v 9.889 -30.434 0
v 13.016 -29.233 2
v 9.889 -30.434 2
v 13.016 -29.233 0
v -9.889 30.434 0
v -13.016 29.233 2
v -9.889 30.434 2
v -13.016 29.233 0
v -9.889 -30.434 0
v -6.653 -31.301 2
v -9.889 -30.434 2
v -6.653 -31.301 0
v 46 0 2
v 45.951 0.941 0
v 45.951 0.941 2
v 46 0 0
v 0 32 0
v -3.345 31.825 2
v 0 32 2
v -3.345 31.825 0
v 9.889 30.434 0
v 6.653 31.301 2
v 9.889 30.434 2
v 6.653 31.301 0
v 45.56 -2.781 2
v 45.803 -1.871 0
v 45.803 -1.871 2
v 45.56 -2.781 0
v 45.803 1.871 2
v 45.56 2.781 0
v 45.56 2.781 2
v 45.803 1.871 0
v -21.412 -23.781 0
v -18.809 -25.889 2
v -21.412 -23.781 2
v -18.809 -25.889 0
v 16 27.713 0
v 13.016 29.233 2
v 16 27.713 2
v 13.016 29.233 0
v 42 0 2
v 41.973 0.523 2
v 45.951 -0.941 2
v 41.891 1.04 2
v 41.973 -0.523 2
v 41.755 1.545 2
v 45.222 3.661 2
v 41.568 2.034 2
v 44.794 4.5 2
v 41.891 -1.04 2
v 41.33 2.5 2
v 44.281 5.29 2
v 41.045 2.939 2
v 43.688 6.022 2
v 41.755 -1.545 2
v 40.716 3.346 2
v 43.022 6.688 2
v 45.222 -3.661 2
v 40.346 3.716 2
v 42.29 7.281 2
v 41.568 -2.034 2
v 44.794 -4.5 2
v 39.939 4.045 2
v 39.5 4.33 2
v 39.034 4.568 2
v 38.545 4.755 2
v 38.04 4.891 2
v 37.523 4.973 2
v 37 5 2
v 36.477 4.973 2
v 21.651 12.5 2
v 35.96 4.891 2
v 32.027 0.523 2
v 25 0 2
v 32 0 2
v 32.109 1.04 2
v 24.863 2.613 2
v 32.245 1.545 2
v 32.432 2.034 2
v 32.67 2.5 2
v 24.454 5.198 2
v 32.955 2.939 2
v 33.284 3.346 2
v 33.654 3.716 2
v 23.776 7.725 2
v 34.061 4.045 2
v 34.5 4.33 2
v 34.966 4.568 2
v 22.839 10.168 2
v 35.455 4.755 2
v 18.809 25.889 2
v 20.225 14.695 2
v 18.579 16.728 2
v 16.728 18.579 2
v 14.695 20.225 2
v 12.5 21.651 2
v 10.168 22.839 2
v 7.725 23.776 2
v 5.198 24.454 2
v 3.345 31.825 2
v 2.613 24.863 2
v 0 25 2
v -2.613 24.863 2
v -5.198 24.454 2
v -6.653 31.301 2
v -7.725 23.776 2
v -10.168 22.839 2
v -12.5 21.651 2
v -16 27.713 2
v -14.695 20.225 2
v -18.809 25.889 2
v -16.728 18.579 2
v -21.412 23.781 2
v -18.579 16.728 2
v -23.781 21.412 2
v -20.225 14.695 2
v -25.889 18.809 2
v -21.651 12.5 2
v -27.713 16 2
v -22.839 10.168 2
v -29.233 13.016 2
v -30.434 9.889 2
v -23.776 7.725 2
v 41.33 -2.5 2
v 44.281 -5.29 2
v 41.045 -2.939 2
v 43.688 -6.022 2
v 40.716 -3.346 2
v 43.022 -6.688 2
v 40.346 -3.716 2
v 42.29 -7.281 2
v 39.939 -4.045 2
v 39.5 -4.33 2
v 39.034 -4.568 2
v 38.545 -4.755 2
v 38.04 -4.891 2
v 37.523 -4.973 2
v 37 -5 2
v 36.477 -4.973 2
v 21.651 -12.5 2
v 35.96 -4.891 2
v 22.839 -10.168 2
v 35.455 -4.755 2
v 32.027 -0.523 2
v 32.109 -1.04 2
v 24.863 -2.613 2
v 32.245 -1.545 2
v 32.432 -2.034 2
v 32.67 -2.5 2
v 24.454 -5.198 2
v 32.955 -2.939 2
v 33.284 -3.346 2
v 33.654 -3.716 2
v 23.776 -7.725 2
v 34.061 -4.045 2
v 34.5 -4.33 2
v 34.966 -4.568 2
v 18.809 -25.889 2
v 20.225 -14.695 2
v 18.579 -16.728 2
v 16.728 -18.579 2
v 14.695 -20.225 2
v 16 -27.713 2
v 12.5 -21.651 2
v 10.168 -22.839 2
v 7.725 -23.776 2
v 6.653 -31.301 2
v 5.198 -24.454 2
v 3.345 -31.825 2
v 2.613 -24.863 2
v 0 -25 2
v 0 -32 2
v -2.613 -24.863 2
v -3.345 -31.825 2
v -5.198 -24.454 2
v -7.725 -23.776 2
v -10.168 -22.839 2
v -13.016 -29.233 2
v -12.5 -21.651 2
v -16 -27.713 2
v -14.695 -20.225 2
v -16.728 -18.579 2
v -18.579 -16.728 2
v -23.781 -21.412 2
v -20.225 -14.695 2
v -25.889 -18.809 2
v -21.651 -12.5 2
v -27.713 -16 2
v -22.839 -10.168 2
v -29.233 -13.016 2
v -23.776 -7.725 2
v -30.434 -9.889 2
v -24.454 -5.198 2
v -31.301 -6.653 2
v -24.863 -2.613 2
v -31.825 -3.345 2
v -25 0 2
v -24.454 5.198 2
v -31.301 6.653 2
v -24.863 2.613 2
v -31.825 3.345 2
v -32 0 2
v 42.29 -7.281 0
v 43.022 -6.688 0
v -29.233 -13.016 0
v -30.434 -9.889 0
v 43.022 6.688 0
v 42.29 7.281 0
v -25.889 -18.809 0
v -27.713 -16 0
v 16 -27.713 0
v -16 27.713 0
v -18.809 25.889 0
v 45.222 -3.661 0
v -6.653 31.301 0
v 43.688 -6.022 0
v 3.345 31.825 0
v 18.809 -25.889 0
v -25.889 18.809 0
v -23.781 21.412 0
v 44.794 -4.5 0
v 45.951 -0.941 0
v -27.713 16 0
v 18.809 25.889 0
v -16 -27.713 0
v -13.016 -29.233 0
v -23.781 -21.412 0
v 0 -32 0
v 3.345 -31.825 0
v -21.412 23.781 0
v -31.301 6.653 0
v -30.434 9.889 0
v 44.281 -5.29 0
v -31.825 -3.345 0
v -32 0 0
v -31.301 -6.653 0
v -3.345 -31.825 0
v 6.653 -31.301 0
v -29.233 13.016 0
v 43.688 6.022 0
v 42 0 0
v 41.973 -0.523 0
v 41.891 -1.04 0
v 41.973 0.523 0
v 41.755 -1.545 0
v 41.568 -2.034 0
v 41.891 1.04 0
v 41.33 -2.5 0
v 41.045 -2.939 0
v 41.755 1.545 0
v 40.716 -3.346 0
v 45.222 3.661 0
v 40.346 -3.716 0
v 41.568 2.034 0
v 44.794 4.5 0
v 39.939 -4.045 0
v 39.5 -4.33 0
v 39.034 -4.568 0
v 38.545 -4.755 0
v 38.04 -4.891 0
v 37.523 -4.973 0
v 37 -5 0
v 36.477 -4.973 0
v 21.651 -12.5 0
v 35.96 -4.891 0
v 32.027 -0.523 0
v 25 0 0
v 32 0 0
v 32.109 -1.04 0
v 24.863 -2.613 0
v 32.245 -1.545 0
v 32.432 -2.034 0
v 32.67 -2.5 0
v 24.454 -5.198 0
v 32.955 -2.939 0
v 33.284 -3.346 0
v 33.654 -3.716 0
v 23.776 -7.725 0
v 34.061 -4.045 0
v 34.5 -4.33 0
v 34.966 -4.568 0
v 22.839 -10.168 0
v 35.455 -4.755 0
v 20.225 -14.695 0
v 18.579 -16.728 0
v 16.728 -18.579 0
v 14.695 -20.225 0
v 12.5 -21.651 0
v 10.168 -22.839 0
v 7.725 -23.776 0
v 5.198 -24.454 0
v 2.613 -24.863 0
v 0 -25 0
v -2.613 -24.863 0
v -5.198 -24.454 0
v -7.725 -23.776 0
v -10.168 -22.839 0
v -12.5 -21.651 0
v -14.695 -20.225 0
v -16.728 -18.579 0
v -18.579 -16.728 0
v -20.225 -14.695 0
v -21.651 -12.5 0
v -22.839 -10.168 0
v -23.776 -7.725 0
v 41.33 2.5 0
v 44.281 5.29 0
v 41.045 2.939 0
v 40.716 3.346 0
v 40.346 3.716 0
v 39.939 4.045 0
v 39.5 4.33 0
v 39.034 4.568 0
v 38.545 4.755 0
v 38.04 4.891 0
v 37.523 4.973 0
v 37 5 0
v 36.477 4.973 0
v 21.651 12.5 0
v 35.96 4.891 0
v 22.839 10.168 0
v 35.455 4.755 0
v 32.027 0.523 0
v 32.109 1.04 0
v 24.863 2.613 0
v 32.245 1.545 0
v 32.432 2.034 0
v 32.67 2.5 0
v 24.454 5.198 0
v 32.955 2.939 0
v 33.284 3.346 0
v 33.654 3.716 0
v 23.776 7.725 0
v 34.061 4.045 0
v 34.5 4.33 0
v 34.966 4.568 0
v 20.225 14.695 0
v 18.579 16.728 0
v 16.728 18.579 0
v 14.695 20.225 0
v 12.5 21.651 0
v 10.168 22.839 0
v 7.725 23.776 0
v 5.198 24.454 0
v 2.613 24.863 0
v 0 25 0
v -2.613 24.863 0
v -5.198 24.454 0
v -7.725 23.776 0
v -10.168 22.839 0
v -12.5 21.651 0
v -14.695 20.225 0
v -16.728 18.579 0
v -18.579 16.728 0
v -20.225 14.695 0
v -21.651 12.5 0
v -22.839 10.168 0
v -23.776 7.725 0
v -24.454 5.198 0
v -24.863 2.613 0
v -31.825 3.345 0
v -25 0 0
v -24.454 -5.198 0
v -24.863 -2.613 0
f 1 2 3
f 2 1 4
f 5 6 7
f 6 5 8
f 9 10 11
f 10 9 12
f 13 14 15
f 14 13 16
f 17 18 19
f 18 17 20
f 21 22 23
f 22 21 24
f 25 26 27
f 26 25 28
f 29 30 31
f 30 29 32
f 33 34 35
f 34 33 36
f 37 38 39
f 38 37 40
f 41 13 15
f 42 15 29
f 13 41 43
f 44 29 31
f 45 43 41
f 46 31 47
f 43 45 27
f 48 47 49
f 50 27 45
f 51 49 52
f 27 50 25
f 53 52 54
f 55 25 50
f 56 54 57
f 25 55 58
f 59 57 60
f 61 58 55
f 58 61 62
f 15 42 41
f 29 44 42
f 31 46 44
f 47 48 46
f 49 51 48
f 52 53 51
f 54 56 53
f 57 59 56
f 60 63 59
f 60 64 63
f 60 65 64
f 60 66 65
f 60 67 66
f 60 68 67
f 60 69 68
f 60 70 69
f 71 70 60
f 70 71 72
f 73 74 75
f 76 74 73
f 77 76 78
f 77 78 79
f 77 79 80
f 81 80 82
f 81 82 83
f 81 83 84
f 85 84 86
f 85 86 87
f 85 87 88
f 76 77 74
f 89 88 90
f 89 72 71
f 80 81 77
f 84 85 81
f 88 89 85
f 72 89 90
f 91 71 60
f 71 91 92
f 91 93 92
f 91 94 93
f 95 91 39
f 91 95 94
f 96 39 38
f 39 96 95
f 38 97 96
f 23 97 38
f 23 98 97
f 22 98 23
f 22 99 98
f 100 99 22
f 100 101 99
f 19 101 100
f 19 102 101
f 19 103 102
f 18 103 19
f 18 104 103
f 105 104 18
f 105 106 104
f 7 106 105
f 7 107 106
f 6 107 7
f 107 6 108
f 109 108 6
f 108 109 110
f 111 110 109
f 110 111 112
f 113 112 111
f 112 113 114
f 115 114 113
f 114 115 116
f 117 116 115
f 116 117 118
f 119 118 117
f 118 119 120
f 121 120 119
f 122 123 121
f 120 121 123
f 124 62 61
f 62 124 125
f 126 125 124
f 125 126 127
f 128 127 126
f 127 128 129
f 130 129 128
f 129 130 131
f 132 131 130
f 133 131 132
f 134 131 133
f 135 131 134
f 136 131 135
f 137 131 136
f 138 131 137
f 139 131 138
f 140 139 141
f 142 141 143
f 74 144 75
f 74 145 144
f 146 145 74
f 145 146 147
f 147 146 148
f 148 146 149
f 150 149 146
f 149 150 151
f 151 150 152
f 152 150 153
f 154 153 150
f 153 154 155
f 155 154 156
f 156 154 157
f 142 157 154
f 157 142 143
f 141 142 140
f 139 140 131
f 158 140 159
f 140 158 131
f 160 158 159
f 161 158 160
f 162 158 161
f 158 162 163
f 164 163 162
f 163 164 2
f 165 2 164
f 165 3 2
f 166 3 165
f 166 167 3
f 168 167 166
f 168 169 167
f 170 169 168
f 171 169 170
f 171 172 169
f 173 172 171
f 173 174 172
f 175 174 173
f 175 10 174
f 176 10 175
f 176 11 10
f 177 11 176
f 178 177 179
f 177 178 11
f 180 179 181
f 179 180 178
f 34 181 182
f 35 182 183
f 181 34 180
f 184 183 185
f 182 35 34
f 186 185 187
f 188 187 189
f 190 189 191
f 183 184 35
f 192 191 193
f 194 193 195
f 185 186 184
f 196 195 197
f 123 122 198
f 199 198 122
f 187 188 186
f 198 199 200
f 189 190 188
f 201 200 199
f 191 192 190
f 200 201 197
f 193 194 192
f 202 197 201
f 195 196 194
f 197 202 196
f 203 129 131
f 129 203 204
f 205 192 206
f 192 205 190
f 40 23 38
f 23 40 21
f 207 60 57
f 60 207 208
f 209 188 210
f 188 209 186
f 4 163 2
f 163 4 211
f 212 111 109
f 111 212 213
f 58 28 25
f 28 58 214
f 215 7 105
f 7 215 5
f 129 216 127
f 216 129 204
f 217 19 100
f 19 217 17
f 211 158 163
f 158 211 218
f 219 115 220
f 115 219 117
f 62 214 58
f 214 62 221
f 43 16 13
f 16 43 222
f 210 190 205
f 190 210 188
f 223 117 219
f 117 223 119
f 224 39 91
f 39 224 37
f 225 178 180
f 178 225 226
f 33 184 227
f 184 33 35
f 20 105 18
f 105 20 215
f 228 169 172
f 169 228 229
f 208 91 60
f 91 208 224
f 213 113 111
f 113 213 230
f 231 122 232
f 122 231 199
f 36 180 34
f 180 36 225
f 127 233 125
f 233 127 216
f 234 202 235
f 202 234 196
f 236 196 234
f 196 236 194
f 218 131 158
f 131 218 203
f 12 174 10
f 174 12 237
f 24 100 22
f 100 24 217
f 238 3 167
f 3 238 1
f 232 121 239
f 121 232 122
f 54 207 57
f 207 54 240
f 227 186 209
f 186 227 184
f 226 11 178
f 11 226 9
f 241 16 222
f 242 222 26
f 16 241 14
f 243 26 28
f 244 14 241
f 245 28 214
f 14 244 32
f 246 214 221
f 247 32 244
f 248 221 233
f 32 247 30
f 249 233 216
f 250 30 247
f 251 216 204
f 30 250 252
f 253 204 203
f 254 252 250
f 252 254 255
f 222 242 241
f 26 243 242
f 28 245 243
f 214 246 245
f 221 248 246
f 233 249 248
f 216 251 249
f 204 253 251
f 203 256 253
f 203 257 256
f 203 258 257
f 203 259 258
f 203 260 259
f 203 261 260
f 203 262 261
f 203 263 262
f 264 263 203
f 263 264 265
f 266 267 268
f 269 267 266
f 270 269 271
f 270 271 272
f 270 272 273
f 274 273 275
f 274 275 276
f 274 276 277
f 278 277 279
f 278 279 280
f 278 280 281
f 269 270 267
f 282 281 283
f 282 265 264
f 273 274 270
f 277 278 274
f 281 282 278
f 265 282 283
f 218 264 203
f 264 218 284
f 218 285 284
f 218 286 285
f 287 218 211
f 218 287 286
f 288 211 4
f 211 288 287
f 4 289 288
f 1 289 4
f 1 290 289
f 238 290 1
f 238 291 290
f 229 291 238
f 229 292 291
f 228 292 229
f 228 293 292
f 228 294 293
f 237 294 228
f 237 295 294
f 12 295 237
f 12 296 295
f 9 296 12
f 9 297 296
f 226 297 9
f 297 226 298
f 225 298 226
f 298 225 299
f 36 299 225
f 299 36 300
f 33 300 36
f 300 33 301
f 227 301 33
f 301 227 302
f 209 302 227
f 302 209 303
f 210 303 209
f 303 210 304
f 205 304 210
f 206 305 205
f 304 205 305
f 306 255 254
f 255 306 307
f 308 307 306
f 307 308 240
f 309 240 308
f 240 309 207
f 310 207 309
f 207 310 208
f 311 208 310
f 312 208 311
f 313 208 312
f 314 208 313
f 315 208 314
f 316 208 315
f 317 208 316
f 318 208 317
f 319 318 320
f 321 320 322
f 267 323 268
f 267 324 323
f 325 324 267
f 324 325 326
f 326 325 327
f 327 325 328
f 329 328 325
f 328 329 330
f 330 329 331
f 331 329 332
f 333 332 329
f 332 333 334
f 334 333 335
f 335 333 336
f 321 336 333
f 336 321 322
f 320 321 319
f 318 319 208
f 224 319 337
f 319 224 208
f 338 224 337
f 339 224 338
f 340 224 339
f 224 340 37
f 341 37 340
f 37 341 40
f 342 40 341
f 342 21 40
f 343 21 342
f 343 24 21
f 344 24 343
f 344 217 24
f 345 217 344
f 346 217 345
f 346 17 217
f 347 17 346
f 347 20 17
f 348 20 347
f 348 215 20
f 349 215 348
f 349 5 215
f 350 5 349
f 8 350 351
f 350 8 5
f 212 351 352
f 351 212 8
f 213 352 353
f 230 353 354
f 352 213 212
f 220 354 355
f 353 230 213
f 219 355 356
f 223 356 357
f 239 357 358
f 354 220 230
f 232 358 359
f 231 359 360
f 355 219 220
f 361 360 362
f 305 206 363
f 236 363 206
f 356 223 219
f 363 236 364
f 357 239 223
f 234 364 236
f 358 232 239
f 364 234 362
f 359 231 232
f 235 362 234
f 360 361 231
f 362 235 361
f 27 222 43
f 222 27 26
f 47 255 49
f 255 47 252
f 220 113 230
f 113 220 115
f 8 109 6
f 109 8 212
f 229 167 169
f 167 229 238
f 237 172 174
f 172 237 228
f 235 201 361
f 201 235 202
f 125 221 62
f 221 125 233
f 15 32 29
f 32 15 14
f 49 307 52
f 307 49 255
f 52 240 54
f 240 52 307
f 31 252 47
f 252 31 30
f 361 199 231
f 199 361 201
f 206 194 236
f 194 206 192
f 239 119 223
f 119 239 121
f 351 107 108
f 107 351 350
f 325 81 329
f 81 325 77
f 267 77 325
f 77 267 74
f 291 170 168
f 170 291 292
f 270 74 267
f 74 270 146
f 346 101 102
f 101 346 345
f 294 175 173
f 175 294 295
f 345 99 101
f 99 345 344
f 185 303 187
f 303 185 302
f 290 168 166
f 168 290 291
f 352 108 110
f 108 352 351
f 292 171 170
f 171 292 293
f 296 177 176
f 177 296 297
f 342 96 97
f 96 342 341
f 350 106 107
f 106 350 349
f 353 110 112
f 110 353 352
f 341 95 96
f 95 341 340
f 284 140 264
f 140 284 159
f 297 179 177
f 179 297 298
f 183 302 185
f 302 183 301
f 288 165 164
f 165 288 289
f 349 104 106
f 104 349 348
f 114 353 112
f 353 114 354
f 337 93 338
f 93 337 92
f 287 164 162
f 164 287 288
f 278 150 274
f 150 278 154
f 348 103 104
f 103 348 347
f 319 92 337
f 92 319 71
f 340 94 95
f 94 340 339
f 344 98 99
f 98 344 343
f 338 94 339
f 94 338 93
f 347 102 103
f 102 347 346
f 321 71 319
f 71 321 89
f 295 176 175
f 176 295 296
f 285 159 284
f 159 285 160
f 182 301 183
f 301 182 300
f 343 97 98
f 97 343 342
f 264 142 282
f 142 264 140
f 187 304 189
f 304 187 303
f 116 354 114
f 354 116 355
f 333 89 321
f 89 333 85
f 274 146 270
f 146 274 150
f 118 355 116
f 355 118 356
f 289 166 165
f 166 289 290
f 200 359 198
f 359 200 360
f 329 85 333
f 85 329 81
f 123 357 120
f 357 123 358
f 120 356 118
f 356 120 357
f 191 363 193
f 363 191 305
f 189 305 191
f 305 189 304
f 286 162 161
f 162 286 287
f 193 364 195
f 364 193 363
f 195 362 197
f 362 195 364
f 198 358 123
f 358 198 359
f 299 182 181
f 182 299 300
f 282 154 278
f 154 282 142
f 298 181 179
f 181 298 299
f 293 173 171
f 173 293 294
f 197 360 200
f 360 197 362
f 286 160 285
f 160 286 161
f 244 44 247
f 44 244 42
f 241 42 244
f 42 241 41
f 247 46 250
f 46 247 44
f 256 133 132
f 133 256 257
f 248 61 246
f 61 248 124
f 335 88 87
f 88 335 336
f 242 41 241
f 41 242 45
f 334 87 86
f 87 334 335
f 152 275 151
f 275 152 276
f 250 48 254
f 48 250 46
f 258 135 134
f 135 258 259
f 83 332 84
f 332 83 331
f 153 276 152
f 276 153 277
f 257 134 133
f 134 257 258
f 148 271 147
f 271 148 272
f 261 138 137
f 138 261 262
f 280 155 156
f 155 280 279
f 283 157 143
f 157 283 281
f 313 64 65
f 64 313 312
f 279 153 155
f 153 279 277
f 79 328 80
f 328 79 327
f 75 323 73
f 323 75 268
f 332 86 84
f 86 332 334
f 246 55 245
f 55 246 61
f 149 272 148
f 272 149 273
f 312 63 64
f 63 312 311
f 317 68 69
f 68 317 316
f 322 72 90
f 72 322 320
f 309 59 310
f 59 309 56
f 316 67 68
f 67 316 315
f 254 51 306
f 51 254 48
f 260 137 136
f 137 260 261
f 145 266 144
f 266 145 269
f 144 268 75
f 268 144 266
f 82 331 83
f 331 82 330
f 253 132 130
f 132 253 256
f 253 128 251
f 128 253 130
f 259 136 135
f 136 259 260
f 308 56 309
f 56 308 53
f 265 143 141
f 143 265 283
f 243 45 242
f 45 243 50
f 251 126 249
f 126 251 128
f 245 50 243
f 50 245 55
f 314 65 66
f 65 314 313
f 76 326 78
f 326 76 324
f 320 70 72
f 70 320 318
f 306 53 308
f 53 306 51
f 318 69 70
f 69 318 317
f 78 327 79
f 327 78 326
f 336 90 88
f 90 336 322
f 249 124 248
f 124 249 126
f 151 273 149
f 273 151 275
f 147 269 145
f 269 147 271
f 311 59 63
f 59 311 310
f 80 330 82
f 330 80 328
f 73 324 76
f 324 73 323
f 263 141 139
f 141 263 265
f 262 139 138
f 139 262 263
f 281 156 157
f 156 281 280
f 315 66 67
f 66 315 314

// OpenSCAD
//Diameter of ring opening in mm
hole=50;

/* [Hidden] */
$fn=60;

difference() {
	hull() {
		cylinder(r=hole/2+7,h=2);
		translate([hole/2+7+5,0,0]) cylinder(r=9,h=2);
	}
	translate([0,0,-1])cylinder(r=hole/2,h=4);
	translate([hole/2+7+5,0,-1])cylinder(r=5,h=5);
}
